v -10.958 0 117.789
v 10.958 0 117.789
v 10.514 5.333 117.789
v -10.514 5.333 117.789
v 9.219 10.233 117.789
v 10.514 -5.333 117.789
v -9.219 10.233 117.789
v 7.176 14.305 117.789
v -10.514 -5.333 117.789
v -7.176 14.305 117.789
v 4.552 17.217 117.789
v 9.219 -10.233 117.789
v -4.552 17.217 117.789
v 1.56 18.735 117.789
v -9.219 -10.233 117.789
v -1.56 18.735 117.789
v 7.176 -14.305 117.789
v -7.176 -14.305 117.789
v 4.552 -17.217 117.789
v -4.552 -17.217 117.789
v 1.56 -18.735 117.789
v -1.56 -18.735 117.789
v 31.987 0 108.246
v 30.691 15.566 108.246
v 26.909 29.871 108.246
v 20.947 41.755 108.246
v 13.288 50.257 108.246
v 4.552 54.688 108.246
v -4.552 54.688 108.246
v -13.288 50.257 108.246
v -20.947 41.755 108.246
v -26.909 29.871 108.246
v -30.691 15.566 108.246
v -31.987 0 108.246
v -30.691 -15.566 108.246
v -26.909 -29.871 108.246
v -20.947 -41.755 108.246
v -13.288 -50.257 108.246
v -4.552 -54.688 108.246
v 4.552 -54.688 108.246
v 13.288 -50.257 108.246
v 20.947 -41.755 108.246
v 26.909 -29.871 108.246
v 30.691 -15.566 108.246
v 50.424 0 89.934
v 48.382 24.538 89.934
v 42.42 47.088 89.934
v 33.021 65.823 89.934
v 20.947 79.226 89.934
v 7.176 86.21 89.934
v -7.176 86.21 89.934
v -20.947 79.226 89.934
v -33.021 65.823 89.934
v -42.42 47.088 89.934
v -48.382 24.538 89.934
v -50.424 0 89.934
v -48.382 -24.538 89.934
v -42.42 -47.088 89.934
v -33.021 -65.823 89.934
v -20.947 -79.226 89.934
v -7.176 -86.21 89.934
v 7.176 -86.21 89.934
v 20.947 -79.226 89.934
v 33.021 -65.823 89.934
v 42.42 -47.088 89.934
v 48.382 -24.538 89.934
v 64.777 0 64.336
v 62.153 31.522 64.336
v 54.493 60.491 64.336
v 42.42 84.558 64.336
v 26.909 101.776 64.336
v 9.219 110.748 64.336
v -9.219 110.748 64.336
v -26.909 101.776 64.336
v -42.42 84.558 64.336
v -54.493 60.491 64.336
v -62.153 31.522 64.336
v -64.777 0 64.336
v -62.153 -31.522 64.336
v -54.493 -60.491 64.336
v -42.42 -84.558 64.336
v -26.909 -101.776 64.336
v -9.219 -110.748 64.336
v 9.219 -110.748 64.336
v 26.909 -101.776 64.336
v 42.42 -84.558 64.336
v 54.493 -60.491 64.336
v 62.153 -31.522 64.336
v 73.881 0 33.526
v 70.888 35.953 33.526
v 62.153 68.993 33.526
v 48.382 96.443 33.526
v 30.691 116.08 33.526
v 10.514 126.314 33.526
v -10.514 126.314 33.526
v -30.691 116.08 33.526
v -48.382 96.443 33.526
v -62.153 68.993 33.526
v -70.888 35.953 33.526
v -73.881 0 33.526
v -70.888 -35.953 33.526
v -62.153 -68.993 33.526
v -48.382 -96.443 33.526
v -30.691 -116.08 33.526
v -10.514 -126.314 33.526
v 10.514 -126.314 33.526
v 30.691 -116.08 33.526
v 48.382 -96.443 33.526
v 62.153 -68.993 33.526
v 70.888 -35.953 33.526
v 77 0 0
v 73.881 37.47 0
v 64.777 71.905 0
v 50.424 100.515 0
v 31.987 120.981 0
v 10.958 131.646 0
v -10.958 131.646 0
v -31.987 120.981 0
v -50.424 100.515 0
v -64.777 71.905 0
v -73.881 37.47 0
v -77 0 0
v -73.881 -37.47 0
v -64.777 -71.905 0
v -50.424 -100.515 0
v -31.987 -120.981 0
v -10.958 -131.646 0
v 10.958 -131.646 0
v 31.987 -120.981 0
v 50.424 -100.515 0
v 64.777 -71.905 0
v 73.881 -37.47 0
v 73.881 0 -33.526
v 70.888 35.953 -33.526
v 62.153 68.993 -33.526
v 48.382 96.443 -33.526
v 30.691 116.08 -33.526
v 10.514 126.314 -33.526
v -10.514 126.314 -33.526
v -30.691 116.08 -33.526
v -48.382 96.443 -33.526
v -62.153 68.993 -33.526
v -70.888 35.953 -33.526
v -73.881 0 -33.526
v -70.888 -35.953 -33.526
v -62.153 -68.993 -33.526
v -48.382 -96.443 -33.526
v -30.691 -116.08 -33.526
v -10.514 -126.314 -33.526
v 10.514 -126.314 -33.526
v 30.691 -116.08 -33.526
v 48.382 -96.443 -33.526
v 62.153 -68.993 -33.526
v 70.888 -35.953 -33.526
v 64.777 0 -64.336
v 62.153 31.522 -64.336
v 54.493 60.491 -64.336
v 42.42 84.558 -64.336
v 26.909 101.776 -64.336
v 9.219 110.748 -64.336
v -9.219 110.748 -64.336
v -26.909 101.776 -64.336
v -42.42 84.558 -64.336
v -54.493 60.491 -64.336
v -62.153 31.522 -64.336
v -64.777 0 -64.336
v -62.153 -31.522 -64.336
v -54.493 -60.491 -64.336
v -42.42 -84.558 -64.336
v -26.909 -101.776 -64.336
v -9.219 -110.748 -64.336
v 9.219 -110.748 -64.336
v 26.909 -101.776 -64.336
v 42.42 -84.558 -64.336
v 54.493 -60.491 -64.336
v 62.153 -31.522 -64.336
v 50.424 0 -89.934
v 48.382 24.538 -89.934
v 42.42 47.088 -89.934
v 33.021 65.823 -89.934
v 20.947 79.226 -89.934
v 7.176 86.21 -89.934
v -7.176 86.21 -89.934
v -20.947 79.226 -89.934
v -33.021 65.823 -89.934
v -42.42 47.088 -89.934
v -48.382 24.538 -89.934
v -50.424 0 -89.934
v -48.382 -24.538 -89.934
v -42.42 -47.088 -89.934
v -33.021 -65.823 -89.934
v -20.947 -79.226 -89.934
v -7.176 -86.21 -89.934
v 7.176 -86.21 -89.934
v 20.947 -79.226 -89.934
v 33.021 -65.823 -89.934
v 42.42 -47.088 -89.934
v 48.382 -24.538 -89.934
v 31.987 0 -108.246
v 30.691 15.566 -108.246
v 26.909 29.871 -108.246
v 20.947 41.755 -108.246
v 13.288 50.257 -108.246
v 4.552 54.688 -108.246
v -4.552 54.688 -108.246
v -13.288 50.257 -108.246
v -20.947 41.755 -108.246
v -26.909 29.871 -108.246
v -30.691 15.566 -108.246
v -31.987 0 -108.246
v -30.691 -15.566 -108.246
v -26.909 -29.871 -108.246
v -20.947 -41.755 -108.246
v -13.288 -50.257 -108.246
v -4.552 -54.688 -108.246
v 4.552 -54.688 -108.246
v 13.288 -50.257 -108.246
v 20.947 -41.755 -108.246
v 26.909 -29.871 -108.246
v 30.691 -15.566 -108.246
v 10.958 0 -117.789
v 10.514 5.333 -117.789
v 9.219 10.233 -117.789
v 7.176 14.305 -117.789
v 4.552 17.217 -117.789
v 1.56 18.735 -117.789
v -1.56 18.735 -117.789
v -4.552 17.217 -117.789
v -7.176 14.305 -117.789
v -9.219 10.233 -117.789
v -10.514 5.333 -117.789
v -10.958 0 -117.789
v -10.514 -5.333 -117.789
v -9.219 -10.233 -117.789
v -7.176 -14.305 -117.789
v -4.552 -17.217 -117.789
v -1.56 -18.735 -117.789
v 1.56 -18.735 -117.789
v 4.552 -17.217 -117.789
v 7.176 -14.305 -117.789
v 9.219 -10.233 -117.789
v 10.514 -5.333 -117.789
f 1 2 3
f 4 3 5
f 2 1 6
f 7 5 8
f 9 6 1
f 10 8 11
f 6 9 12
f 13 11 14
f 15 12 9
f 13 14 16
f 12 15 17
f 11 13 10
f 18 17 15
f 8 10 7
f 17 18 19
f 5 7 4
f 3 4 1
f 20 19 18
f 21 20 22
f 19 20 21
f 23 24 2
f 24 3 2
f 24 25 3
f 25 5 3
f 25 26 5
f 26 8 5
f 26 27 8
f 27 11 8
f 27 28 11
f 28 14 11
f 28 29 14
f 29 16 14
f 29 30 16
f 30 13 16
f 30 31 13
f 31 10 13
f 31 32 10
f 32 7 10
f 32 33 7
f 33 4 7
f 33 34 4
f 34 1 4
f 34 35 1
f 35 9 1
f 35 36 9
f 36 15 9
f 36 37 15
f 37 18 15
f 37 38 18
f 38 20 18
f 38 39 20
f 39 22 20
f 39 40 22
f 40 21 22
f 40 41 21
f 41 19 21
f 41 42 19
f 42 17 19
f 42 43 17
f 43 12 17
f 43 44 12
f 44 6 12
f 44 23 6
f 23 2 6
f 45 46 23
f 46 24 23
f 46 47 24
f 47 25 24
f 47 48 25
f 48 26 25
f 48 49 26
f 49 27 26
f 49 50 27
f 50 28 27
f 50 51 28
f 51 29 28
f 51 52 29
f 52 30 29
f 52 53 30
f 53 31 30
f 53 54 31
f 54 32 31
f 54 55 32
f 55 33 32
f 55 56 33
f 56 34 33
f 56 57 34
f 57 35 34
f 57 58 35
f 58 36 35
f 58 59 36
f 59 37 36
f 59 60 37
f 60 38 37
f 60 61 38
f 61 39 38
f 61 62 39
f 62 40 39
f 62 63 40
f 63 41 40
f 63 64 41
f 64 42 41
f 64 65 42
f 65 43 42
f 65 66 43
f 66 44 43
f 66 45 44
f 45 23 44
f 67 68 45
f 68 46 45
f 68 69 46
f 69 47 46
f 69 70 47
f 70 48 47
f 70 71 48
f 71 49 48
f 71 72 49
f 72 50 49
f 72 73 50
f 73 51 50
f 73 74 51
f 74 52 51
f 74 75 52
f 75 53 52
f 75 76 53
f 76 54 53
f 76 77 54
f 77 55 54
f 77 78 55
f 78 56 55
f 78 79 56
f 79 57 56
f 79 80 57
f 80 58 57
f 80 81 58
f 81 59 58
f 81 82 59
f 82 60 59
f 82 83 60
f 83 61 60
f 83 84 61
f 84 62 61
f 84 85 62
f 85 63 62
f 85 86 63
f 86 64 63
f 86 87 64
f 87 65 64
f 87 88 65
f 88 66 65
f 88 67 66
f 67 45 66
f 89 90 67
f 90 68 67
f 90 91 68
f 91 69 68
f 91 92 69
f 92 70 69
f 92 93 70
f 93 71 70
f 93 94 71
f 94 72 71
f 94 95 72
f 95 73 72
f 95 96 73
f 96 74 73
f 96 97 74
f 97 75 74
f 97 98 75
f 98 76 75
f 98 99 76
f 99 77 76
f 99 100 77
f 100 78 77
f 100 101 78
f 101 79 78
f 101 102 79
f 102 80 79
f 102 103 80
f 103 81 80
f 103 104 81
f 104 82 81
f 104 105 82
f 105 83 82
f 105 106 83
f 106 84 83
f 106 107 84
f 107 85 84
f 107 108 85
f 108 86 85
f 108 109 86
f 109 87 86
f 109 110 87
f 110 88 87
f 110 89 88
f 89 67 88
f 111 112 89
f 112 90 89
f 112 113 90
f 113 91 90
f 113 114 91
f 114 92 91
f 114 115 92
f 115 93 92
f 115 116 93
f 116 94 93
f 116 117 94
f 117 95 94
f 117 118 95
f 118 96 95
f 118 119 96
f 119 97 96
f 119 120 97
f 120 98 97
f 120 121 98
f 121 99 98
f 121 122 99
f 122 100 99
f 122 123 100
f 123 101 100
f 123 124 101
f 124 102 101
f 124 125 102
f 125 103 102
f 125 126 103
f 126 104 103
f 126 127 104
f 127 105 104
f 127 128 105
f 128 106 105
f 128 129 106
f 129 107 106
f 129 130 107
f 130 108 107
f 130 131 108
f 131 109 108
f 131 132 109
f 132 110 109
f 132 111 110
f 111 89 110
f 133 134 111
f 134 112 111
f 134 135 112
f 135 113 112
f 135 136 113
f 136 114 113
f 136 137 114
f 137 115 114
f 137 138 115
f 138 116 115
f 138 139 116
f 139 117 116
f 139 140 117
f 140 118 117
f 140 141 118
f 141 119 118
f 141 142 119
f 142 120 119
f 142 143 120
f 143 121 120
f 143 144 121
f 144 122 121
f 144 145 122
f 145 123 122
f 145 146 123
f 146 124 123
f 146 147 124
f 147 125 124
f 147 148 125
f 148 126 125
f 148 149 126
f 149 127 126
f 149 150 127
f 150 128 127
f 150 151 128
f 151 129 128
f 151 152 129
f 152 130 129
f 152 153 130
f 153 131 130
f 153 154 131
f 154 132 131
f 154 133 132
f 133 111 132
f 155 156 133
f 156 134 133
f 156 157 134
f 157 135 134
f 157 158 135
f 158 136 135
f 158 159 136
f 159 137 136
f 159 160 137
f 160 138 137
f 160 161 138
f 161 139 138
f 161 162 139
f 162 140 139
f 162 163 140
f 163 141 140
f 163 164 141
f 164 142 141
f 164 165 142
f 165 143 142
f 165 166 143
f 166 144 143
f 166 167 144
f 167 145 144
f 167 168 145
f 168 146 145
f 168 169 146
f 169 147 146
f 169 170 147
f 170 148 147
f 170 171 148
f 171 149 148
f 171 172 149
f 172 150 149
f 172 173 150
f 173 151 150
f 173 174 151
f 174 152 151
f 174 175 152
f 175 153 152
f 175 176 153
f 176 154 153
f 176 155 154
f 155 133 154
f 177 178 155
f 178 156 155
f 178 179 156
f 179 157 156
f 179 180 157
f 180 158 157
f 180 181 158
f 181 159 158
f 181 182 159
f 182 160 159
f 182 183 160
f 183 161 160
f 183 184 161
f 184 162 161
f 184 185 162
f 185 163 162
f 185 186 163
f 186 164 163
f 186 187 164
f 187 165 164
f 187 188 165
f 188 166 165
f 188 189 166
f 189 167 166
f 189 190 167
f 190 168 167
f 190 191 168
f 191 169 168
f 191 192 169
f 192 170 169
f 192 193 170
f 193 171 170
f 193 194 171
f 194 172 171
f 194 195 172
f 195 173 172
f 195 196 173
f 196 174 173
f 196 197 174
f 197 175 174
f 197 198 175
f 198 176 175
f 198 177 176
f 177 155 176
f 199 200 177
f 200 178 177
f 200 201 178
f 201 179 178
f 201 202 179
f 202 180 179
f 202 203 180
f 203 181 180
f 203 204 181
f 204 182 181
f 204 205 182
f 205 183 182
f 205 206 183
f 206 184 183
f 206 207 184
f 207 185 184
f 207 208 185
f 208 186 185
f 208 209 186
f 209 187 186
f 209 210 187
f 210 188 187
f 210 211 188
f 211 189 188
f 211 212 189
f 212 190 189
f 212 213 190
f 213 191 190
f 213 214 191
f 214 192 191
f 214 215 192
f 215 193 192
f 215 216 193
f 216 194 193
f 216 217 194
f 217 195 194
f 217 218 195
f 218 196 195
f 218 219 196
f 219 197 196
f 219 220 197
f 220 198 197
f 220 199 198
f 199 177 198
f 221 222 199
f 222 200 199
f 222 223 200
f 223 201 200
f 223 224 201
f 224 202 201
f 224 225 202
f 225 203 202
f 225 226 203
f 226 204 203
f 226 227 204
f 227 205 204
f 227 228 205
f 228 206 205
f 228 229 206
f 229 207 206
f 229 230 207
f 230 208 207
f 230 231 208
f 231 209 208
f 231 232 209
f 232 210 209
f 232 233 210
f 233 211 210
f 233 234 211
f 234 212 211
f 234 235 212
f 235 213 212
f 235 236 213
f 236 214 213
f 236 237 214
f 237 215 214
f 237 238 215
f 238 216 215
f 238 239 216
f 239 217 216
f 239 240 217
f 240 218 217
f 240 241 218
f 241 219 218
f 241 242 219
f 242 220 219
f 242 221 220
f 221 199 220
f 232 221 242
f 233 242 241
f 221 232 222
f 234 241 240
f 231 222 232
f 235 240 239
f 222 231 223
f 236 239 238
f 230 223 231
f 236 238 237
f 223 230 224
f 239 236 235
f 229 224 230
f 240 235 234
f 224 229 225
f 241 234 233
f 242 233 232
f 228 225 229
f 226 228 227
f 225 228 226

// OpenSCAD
// Generated by SolidPython 1.0.1 on 2020-07-29 00:46:50


scale(v = [11, 19, 17]) {
	sphere(r = 7);
}
/***********************************************
*********      SolidPython code:      **********
************************************************
 
# import packages: SolidPython
from solid import *
from solid.utils import *
from itertools import chain, combinations, permutations


class Resize:

    def __init__(self, scad_file):
        self.scad_file = scad_file
        #self.scad_file = import_scad(scad_file)
        # cone/cylinder param:
        self.r1 = 0
        self.r2 = 0
        self.h = 0
        # rectangular prism param:
        self.w = 0
        self.l = 0
        # ellipse param:
        self.r = 0

    # import OpenScad code (file name corresponds to shape)


    # classify shape + parameters
    def assign(self, param1, param2, param3):
        if self.scad_file == 'cone.scad':
            self.r1 = param1
            self.r2 = param2
            self.h = param3
        elif self.scad_file == 'cylinder.scad':
            self.r1 = param1
            self.r2 = param2
            self.h = param3
        elif self.scad_file == 'rectangularPrism.scad':
            self.h = param1
            self.l = param2
            self.w = param3
        else:
            self.r = param1
            self.h = param2

    # resize parameters
    def iterate(self):
        x = range(3, 20, 2)
        i = 1
        if self.scad_file == 'cone.scad':
            tempList = list(permutations(x, 2))
            for temp in tempList:
                param1 = temp[0]
                param2 = temp[1]
                filepath = 'produced_scad_files/' + 'cone' + str(param1) + '_' + str(param2) + '_' + '.scad'
                scad_render_to_file(cylinder(h=param1, r1=param2, r2=0), filepath)

        elif self.scad_file == 'cylinder.scad':
            tempList = list(permutations(x, 3))
            for temp in tempList:
                param1 = temp[0]
                param2 = temp[1]
                filepath = 'produced_scad_files/' + 'cylinder' + str(param1) + '_' + str(param2) + '_' + '.scad'
                scad_render_to_file(cylinder(h=param1, r1=param2, r2=param2), filepath)

        elif self.scad_file == 'rectangularPrism.scad':
            tempList = list(permutations(x, 3))
            for temp in tempList:
                param1 = temp[0]
                param2 = temp[1]
                param3 = temp[2]
                filepath = 'produced_scad_files/' + 'rectangularPrism' + str(param1) + '_' + str(param2) + '_' + str(
                    param3) + '.scad'
                scad_render_to_file(cube(size=(param1, param2, param3)), filepath)

        elif self.scad_file == 'ellipse.scad':
            tempList = list(permutations(x, 4))
            for temp in tempList:
                param1 = temp[0]
                param2 = temp[1]
                param3 = temp[2]
                param4 = temp[3]
                filepath = 'produced_scad_files/' + 'ellipse' + str(param1) + '_' + str(param2) + '_' + str(param3) + '_' + str(param4) + '.scad'
                scad_render_to_file(scale([param1, param2, param3])(sphere(r=param4)), filepath)

    def render_to_scadfile(self):
        scad_render_to_file(scad, 'example.scad') 
 
************************************************/
